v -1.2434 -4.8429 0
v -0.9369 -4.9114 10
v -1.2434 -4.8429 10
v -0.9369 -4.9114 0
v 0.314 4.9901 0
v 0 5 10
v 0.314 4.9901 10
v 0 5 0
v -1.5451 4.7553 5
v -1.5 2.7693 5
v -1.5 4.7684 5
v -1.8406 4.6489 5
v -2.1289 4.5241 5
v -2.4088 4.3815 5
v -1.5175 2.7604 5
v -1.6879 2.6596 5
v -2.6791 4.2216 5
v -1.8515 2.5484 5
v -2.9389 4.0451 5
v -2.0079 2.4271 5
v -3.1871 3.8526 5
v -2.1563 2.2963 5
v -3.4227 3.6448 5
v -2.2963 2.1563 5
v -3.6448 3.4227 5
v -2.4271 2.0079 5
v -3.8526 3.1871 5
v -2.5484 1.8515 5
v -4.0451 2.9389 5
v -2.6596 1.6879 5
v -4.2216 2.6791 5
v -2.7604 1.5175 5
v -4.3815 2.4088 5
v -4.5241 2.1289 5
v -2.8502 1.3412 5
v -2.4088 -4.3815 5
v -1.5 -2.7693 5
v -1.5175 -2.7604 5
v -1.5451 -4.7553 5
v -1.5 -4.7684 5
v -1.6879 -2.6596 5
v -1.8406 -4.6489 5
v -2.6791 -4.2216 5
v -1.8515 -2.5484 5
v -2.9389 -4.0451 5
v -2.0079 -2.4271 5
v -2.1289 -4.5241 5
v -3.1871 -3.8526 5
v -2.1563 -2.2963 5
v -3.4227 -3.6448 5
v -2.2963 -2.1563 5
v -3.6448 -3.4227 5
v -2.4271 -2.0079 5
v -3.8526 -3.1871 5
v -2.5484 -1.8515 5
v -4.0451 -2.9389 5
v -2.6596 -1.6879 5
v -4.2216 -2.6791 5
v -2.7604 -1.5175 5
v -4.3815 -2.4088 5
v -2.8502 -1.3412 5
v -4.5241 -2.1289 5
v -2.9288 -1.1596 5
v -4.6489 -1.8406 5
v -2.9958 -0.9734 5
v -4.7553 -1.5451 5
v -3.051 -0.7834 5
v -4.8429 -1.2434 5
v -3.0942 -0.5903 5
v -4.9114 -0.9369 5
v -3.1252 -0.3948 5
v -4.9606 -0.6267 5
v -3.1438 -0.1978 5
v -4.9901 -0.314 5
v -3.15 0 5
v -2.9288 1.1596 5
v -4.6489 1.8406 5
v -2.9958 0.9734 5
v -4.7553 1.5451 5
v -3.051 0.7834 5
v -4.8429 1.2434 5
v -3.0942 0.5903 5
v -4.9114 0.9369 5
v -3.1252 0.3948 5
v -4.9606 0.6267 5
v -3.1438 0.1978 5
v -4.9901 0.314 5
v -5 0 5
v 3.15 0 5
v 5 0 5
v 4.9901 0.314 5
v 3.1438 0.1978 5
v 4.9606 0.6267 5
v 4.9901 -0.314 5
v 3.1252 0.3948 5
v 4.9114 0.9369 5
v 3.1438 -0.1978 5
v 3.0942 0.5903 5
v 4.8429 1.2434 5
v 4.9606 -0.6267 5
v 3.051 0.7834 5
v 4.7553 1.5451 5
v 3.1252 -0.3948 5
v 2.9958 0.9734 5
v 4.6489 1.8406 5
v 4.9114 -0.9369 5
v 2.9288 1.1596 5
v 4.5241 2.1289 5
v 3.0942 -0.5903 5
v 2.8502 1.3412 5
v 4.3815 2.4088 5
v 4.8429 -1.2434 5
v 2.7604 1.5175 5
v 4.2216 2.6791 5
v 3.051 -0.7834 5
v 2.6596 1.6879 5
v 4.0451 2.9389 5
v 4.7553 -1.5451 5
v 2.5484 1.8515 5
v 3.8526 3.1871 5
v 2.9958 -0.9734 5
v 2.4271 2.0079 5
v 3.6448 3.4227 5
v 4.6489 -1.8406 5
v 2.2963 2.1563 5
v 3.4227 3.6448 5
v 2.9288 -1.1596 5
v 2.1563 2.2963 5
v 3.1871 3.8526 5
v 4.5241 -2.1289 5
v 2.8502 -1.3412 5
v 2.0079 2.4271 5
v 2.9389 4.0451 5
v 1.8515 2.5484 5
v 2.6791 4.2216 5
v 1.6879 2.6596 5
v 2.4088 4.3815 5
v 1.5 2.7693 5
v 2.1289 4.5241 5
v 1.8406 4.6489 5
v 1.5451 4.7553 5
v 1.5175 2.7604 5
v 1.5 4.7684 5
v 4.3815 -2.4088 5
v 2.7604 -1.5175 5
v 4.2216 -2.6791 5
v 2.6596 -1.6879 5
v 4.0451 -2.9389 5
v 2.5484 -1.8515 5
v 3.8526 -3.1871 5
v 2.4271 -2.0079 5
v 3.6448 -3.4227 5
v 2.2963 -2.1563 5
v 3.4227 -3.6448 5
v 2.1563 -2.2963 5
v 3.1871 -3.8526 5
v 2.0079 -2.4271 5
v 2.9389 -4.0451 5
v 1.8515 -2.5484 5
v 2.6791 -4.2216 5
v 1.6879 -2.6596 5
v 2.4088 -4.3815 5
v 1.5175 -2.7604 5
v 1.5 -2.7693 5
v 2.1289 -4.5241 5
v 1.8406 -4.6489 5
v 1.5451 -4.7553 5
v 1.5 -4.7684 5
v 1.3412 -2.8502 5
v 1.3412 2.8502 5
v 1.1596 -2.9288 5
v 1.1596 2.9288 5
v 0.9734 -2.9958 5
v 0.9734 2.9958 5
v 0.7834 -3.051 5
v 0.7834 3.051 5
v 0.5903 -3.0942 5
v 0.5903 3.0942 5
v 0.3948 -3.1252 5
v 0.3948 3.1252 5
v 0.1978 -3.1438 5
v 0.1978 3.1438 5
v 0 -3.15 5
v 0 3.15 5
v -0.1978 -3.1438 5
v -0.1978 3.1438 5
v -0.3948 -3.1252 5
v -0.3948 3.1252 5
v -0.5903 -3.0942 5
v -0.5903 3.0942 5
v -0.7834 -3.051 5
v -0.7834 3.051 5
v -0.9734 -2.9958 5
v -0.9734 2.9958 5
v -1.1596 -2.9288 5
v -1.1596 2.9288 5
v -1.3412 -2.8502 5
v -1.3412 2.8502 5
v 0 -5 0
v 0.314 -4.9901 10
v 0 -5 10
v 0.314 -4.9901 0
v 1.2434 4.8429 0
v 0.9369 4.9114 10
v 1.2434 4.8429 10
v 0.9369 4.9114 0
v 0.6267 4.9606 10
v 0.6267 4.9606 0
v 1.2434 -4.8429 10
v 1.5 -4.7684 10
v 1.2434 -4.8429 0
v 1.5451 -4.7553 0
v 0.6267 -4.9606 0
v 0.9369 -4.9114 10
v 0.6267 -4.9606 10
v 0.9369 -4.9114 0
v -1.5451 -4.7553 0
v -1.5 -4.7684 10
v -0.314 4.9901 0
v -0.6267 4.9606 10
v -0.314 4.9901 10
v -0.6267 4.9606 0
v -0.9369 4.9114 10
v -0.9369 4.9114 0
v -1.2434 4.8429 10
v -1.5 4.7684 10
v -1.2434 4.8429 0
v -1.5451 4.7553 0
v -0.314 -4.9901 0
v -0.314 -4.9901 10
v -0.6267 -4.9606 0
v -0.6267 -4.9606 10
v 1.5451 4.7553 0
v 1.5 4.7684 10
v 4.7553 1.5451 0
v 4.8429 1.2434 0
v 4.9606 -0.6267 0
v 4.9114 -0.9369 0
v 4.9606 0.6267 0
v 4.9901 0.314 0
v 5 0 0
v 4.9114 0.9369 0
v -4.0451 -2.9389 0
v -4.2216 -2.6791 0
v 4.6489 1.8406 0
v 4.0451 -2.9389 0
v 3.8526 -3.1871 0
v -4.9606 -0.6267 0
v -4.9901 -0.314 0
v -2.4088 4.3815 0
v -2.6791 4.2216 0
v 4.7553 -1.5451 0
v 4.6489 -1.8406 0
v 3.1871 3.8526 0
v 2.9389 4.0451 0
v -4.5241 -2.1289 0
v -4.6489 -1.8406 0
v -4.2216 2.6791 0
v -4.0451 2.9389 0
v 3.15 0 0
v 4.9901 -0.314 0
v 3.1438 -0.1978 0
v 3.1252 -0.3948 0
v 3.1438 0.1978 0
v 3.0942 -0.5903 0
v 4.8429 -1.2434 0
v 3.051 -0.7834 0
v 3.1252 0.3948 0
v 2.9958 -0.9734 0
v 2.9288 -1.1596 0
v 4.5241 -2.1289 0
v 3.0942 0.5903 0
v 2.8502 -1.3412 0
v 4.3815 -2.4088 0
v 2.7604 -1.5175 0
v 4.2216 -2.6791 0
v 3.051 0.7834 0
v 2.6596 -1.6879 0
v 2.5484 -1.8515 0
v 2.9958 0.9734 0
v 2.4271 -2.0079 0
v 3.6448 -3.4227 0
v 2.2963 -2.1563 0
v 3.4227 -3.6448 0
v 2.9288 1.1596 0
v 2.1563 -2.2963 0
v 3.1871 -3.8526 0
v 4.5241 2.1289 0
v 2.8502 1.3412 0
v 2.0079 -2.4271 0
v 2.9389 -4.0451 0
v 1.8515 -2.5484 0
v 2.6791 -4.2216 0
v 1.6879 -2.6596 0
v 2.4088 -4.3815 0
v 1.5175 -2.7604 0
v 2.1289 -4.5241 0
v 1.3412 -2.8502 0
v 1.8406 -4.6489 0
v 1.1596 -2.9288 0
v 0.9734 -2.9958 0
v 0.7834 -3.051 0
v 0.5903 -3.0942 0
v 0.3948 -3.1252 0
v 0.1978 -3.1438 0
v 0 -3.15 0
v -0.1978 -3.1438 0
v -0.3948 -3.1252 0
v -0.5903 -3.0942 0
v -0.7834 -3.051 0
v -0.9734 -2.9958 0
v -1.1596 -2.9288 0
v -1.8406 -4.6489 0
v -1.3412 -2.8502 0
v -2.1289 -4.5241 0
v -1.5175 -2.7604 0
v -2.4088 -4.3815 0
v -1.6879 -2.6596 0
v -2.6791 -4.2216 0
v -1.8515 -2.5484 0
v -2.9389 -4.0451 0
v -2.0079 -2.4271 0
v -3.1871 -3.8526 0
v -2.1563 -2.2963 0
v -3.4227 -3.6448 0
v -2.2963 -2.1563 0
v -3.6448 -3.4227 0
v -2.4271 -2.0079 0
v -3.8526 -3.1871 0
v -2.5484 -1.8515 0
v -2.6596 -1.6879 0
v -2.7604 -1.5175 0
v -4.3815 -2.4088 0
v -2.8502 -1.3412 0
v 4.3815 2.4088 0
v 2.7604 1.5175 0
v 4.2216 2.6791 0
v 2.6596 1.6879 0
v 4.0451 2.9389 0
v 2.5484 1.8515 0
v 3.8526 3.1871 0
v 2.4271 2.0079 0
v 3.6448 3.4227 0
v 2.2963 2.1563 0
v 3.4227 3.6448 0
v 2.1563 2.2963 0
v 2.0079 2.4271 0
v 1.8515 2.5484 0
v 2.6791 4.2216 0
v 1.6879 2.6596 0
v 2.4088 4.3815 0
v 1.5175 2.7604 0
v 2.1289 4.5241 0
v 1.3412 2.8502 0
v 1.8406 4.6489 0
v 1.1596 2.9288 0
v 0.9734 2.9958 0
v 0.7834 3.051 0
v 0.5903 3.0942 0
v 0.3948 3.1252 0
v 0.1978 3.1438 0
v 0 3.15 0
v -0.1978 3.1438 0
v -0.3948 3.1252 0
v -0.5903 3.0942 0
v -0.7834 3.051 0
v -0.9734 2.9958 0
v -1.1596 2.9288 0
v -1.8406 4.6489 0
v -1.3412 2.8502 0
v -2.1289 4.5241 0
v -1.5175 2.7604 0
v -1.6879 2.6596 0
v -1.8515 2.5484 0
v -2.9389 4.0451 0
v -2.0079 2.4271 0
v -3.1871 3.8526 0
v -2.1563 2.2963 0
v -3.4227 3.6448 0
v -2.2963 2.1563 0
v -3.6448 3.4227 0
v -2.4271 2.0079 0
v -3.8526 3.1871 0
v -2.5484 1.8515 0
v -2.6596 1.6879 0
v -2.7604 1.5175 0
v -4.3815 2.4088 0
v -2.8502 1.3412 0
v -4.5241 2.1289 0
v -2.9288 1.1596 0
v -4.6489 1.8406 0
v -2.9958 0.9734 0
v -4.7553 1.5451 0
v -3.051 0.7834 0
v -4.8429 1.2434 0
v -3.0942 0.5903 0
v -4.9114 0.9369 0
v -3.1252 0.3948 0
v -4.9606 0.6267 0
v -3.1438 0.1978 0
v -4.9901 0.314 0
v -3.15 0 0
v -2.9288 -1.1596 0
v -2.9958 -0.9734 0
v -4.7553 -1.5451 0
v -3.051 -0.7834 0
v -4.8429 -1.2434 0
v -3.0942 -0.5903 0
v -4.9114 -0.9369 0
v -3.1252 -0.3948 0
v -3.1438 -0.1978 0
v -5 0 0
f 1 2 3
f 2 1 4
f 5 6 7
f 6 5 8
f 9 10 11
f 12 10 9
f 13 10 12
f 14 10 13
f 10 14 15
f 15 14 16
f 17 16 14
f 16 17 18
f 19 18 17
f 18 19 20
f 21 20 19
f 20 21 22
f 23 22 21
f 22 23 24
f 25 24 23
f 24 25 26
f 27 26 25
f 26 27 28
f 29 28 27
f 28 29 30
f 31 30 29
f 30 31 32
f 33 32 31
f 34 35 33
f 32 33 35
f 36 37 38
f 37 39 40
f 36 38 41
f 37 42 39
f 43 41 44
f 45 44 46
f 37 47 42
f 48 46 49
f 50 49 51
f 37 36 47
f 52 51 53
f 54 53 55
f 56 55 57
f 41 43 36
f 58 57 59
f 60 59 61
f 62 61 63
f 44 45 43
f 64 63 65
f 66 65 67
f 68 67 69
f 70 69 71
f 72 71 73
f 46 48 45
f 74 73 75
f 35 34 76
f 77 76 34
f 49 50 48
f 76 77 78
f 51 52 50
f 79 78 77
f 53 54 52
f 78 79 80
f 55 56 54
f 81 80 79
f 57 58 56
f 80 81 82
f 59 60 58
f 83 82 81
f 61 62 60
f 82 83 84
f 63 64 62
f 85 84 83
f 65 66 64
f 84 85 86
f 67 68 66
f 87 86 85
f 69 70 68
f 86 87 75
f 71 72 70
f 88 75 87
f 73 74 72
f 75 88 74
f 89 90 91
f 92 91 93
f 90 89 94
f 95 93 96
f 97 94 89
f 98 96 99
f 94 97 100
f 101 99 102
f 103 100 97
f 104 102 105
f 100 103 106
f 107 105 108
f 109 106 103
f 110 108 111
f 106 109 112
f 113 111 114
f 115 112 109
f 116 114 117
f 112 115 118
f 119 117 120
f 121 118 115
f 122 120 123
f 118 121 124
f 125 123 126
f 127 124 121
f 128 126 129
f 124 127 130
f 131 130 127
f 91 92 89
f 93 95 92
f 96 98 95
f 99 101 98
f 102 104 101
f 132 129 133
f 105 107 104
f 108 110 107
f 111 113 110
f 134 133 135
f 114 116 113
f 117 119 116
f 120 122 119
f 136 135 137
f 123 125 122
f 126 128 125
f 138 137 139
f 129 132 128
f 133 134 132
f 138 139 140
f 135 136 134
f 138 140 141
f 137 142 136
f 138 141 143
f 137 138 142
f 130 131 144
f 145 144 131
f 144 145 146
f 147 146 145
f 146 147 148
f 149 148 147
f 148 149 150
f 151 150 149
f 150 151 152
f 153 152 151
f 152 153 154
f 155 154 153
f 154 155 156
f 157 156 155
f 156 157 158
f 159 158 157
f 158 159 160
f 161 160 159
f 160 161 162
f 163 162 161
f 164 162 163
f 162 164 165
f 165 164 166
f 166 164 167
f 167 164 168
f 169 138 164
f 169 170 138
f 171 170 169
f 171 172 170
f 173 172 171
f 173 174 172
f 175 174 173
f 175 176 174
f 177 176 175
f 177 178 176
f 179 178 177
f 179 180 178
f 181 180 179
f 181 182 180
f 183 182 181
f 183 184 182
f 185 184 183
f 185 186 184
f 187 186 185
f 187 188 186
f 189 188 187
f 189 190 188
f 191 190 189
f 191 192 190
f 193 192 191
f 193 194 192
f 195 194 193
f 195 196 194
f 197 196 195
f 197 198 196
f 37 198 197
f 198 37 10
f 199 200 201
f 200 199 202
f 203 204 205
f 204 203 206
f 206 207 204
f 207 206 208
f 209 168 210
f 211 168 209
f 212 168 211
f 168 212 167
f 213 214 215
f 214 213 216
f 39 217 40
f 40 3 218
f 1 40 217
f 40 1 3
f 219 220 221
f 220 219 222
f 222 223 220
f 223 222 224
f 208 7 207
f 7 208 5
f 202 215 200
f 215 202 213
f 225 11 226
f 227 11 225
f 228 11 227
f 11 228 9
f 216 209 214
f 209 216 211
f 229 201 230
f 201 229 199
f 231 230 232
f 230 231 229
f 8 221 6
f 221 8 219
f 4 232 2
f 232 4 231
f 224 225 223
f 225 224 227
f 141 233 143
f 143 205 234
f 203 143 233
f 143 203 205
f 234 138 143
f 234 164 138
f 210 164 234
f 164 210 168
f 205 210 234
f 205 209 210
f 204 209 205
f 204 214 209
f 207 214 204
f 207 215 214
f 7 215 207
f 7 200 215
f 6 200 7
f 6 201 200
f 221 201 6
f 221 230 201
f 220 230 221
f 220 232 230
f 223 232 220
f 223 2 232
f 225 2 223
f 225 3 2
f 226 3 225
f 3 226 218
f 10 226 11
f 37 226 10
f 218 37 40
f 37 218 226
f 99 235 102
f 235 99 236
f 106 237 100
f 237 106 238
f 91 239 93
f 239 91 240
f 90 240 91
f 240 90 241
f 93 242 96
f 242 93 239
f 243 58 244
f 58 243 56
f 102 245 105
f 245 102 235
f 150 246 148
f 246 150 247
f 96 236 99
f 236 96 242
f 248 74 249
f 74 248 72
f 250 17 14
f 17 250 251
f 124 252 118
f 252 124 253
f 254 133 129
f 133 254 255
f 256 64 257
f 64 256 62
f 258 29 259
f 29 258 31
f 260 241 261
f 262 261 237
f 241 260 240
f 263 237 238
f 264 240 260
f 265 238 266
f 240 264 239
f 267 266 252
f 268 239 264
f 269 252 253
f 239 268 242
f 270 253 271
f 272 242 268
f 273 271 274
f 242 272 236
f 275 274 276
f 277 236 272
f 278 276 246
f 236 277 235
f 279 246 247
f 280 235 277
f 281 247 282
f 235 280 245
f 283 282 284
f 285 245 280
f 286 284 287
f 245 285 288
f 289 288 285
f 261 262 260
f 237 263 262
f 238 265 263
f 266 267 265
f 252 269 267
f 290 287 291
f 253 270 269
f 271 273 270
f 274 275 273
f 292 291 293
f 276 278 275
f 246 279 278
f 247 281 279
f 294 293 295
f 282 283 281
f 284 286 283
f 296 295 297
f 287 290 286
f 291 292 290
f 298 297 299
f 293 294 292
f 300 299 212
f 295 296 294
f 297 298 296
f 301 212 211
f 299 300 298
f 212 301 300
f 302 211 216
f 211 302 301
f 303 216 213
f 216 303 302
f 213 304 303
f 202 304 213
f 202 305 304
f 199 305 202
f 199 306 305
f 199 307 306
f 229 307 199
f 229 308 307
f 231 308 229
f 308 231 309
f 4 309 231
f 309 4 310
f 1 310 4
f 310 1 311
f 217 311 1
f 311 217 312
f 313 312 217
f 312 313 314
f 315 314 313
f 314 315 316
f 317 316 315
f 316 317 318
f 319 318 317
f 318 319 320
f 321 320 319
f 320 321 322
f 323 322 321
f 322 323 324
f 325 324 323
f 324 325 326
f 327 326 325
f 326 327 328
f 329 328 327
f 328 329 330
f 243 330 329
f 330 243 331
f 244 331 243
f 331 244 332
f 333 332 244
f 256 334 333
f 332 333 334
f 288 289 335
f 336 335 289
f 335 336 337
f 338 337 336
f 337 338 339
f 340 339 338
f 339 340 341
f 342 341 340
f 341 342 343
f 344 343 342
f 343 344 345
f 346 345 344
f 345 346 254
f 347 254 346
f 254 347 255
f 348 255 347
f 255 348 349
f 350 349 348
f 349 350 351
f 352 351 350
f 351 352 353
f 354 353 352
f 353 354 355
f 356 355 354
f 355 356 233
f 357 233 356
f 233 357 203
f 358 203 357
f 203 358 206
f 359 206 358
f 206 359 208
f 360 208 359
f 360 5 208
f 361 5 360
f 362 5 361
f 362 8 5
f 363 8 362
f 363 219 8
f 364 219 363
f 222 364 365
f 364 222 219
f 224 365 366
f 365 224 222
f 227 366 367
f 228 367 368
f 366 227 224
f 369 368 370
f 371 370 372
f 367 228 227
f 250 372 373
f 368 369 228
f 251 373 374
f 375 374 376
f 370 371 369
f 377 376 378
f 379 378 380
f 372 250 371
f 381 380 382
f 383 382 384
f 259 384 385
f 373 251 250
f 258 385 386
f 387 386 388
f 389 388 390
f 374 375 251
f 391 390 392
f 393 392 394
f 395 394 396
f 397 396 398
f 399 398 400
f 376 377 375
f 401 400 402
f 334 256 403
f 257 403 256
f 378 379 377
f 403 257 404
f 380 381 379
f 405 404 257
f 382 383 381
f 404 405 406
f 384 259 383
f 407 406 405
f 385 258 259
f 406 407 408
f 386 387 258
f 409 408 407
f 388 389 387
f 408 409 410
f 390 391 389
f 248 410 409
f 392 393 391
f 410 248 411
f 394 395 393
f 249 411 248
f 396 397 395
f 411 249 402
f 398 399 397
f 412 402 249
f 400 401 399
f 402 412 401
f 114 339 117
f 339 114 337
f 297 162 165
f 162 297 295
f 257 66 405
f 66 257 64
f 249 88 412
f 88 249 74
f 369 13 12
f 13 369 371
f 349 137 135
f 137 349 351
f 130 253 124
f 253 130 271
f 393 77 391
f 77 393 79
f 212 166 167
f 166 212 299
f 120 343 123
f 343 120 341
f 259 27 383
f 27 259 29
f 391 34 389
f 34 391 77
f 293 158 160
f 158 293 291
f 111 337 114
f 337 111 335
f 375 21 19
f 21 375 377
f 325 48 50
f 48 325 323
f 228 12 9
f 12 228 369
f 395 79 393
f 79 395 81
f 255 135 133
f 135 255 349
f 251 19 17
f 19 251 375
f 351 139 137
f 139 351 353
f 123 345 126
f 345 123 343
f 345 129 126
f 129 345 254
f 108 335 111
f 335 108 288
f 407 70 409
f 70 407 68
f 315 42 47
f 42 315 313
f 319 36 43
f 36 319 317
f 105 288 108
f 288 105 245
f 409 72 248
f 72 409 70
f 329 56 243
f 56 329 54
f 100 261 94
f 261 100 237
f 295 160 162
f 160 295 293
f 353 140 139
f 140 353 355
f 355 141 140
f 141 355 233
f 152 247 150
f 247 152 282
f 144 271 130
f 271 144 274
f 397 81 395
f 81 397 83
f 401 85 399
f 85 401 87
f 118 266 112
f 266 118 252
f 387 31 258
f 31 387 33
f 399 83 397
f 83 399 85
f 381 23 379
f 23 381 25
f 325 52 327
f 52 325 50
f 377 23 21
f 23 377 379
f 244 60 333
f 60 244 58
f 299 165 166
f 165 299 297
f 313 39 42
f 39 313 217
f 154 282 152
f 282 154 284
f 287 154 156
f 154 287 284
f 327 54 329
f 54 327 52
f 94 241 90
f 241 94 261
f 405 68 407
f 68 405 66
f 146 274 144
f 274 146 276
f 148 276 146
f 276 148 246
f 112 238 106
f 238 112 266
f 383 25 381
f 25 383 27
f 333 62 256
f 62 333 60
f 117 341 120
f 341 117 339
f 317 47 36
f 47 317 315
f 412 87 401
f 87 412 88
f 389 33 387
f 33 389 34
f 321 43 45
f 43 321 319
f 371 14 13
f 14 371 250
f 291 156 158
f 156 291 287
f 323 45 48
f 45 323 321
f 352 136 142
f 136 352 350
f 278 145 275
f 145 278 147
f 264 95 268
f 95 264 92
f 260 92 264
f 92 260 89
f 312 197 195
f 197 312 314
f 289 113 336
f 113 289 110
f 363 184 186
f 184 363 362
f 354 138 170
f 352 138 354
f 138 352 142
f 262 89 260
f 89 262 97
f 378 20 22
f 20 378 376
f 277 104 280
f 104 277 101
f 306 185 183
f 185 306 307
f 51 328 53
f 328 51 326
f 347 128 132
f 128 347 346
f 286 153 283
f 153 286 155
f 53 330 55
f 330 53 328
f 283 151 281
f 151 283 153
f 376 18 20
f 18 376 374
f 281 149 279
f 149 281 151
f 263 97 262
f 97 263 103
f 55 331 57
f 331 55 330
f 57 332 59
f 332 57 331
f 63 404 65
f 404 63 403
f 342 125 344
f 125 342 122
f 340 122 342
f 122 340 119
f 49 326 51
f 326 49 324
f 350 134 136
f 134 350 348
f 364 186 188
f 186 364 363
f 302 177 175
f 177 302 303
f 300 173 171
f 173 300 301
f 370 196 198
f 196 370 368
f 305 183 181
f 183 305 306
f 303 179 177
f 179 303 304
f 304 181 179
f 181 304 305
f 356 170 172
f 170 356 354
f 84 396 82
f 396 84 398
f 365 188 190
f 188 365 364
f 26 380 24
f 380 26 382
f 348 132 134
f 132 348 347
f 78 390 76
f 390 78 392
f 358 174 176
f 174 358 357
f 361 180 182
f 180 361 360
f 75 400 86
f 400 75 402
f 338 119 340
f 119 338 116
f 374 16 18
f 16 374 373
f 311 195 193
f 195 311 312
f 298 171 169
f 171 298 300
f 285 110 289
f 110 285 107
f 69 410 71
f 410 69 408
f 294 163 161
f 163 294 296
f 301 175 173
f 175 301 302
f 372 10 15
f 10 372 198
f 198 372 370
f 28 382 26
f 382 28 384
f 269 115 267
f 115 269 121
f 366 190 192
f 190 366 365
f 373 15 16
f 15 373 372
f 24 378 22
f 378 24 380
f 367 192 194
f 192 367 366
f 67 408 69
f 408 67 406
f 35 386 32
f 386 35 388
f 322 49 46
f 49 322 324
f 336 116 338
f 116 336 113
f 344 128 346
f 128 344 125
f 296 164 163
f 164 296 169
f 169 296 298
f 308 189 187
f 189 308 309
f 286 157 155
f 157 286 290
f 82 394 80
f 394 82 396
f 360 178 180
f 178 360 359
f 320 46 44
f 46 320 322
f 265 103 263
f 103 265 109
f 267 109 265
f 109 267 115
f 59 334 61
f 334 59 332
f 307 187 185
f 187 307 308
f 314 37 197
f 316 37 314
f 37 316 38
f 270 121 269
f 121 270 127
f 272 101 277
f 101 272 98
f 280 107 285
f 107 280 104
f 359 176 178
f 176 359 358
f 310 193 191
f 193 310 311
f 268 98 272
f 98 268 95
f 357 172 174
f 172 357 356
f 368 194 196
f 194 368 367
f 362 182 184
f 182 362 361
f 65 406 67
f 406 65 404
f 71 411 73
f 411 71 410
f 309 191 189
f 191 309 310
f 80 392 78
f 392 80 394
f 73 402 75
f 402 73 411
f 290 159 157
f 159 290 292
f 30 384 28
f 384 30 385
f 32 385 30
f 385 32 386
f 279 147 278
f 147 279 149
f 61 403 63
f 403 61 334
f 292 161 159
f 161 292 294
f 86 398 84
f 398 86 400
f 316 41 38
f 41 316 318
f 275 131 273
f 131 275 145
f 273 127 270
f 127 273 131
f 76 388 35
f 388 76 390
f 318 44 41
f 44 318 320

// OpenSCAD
$fn=100;
height=10;
diameter=10;

shaftdiam=6.3;

coupledepth=5;
couplewidth=3;

difference(){
	union(){
		cylinder(h=(height-coupledepth),r=diameter/2);
		translate([0,0,coupledepth])
		intersection(){
			cylinder(h=100,r=diameter/2);
			cube([couplewidth,100,coupledepth*2],center=true);
		}
	}
	cylinder(h=height-coupledepth,r=shaftdiam/2);
}
